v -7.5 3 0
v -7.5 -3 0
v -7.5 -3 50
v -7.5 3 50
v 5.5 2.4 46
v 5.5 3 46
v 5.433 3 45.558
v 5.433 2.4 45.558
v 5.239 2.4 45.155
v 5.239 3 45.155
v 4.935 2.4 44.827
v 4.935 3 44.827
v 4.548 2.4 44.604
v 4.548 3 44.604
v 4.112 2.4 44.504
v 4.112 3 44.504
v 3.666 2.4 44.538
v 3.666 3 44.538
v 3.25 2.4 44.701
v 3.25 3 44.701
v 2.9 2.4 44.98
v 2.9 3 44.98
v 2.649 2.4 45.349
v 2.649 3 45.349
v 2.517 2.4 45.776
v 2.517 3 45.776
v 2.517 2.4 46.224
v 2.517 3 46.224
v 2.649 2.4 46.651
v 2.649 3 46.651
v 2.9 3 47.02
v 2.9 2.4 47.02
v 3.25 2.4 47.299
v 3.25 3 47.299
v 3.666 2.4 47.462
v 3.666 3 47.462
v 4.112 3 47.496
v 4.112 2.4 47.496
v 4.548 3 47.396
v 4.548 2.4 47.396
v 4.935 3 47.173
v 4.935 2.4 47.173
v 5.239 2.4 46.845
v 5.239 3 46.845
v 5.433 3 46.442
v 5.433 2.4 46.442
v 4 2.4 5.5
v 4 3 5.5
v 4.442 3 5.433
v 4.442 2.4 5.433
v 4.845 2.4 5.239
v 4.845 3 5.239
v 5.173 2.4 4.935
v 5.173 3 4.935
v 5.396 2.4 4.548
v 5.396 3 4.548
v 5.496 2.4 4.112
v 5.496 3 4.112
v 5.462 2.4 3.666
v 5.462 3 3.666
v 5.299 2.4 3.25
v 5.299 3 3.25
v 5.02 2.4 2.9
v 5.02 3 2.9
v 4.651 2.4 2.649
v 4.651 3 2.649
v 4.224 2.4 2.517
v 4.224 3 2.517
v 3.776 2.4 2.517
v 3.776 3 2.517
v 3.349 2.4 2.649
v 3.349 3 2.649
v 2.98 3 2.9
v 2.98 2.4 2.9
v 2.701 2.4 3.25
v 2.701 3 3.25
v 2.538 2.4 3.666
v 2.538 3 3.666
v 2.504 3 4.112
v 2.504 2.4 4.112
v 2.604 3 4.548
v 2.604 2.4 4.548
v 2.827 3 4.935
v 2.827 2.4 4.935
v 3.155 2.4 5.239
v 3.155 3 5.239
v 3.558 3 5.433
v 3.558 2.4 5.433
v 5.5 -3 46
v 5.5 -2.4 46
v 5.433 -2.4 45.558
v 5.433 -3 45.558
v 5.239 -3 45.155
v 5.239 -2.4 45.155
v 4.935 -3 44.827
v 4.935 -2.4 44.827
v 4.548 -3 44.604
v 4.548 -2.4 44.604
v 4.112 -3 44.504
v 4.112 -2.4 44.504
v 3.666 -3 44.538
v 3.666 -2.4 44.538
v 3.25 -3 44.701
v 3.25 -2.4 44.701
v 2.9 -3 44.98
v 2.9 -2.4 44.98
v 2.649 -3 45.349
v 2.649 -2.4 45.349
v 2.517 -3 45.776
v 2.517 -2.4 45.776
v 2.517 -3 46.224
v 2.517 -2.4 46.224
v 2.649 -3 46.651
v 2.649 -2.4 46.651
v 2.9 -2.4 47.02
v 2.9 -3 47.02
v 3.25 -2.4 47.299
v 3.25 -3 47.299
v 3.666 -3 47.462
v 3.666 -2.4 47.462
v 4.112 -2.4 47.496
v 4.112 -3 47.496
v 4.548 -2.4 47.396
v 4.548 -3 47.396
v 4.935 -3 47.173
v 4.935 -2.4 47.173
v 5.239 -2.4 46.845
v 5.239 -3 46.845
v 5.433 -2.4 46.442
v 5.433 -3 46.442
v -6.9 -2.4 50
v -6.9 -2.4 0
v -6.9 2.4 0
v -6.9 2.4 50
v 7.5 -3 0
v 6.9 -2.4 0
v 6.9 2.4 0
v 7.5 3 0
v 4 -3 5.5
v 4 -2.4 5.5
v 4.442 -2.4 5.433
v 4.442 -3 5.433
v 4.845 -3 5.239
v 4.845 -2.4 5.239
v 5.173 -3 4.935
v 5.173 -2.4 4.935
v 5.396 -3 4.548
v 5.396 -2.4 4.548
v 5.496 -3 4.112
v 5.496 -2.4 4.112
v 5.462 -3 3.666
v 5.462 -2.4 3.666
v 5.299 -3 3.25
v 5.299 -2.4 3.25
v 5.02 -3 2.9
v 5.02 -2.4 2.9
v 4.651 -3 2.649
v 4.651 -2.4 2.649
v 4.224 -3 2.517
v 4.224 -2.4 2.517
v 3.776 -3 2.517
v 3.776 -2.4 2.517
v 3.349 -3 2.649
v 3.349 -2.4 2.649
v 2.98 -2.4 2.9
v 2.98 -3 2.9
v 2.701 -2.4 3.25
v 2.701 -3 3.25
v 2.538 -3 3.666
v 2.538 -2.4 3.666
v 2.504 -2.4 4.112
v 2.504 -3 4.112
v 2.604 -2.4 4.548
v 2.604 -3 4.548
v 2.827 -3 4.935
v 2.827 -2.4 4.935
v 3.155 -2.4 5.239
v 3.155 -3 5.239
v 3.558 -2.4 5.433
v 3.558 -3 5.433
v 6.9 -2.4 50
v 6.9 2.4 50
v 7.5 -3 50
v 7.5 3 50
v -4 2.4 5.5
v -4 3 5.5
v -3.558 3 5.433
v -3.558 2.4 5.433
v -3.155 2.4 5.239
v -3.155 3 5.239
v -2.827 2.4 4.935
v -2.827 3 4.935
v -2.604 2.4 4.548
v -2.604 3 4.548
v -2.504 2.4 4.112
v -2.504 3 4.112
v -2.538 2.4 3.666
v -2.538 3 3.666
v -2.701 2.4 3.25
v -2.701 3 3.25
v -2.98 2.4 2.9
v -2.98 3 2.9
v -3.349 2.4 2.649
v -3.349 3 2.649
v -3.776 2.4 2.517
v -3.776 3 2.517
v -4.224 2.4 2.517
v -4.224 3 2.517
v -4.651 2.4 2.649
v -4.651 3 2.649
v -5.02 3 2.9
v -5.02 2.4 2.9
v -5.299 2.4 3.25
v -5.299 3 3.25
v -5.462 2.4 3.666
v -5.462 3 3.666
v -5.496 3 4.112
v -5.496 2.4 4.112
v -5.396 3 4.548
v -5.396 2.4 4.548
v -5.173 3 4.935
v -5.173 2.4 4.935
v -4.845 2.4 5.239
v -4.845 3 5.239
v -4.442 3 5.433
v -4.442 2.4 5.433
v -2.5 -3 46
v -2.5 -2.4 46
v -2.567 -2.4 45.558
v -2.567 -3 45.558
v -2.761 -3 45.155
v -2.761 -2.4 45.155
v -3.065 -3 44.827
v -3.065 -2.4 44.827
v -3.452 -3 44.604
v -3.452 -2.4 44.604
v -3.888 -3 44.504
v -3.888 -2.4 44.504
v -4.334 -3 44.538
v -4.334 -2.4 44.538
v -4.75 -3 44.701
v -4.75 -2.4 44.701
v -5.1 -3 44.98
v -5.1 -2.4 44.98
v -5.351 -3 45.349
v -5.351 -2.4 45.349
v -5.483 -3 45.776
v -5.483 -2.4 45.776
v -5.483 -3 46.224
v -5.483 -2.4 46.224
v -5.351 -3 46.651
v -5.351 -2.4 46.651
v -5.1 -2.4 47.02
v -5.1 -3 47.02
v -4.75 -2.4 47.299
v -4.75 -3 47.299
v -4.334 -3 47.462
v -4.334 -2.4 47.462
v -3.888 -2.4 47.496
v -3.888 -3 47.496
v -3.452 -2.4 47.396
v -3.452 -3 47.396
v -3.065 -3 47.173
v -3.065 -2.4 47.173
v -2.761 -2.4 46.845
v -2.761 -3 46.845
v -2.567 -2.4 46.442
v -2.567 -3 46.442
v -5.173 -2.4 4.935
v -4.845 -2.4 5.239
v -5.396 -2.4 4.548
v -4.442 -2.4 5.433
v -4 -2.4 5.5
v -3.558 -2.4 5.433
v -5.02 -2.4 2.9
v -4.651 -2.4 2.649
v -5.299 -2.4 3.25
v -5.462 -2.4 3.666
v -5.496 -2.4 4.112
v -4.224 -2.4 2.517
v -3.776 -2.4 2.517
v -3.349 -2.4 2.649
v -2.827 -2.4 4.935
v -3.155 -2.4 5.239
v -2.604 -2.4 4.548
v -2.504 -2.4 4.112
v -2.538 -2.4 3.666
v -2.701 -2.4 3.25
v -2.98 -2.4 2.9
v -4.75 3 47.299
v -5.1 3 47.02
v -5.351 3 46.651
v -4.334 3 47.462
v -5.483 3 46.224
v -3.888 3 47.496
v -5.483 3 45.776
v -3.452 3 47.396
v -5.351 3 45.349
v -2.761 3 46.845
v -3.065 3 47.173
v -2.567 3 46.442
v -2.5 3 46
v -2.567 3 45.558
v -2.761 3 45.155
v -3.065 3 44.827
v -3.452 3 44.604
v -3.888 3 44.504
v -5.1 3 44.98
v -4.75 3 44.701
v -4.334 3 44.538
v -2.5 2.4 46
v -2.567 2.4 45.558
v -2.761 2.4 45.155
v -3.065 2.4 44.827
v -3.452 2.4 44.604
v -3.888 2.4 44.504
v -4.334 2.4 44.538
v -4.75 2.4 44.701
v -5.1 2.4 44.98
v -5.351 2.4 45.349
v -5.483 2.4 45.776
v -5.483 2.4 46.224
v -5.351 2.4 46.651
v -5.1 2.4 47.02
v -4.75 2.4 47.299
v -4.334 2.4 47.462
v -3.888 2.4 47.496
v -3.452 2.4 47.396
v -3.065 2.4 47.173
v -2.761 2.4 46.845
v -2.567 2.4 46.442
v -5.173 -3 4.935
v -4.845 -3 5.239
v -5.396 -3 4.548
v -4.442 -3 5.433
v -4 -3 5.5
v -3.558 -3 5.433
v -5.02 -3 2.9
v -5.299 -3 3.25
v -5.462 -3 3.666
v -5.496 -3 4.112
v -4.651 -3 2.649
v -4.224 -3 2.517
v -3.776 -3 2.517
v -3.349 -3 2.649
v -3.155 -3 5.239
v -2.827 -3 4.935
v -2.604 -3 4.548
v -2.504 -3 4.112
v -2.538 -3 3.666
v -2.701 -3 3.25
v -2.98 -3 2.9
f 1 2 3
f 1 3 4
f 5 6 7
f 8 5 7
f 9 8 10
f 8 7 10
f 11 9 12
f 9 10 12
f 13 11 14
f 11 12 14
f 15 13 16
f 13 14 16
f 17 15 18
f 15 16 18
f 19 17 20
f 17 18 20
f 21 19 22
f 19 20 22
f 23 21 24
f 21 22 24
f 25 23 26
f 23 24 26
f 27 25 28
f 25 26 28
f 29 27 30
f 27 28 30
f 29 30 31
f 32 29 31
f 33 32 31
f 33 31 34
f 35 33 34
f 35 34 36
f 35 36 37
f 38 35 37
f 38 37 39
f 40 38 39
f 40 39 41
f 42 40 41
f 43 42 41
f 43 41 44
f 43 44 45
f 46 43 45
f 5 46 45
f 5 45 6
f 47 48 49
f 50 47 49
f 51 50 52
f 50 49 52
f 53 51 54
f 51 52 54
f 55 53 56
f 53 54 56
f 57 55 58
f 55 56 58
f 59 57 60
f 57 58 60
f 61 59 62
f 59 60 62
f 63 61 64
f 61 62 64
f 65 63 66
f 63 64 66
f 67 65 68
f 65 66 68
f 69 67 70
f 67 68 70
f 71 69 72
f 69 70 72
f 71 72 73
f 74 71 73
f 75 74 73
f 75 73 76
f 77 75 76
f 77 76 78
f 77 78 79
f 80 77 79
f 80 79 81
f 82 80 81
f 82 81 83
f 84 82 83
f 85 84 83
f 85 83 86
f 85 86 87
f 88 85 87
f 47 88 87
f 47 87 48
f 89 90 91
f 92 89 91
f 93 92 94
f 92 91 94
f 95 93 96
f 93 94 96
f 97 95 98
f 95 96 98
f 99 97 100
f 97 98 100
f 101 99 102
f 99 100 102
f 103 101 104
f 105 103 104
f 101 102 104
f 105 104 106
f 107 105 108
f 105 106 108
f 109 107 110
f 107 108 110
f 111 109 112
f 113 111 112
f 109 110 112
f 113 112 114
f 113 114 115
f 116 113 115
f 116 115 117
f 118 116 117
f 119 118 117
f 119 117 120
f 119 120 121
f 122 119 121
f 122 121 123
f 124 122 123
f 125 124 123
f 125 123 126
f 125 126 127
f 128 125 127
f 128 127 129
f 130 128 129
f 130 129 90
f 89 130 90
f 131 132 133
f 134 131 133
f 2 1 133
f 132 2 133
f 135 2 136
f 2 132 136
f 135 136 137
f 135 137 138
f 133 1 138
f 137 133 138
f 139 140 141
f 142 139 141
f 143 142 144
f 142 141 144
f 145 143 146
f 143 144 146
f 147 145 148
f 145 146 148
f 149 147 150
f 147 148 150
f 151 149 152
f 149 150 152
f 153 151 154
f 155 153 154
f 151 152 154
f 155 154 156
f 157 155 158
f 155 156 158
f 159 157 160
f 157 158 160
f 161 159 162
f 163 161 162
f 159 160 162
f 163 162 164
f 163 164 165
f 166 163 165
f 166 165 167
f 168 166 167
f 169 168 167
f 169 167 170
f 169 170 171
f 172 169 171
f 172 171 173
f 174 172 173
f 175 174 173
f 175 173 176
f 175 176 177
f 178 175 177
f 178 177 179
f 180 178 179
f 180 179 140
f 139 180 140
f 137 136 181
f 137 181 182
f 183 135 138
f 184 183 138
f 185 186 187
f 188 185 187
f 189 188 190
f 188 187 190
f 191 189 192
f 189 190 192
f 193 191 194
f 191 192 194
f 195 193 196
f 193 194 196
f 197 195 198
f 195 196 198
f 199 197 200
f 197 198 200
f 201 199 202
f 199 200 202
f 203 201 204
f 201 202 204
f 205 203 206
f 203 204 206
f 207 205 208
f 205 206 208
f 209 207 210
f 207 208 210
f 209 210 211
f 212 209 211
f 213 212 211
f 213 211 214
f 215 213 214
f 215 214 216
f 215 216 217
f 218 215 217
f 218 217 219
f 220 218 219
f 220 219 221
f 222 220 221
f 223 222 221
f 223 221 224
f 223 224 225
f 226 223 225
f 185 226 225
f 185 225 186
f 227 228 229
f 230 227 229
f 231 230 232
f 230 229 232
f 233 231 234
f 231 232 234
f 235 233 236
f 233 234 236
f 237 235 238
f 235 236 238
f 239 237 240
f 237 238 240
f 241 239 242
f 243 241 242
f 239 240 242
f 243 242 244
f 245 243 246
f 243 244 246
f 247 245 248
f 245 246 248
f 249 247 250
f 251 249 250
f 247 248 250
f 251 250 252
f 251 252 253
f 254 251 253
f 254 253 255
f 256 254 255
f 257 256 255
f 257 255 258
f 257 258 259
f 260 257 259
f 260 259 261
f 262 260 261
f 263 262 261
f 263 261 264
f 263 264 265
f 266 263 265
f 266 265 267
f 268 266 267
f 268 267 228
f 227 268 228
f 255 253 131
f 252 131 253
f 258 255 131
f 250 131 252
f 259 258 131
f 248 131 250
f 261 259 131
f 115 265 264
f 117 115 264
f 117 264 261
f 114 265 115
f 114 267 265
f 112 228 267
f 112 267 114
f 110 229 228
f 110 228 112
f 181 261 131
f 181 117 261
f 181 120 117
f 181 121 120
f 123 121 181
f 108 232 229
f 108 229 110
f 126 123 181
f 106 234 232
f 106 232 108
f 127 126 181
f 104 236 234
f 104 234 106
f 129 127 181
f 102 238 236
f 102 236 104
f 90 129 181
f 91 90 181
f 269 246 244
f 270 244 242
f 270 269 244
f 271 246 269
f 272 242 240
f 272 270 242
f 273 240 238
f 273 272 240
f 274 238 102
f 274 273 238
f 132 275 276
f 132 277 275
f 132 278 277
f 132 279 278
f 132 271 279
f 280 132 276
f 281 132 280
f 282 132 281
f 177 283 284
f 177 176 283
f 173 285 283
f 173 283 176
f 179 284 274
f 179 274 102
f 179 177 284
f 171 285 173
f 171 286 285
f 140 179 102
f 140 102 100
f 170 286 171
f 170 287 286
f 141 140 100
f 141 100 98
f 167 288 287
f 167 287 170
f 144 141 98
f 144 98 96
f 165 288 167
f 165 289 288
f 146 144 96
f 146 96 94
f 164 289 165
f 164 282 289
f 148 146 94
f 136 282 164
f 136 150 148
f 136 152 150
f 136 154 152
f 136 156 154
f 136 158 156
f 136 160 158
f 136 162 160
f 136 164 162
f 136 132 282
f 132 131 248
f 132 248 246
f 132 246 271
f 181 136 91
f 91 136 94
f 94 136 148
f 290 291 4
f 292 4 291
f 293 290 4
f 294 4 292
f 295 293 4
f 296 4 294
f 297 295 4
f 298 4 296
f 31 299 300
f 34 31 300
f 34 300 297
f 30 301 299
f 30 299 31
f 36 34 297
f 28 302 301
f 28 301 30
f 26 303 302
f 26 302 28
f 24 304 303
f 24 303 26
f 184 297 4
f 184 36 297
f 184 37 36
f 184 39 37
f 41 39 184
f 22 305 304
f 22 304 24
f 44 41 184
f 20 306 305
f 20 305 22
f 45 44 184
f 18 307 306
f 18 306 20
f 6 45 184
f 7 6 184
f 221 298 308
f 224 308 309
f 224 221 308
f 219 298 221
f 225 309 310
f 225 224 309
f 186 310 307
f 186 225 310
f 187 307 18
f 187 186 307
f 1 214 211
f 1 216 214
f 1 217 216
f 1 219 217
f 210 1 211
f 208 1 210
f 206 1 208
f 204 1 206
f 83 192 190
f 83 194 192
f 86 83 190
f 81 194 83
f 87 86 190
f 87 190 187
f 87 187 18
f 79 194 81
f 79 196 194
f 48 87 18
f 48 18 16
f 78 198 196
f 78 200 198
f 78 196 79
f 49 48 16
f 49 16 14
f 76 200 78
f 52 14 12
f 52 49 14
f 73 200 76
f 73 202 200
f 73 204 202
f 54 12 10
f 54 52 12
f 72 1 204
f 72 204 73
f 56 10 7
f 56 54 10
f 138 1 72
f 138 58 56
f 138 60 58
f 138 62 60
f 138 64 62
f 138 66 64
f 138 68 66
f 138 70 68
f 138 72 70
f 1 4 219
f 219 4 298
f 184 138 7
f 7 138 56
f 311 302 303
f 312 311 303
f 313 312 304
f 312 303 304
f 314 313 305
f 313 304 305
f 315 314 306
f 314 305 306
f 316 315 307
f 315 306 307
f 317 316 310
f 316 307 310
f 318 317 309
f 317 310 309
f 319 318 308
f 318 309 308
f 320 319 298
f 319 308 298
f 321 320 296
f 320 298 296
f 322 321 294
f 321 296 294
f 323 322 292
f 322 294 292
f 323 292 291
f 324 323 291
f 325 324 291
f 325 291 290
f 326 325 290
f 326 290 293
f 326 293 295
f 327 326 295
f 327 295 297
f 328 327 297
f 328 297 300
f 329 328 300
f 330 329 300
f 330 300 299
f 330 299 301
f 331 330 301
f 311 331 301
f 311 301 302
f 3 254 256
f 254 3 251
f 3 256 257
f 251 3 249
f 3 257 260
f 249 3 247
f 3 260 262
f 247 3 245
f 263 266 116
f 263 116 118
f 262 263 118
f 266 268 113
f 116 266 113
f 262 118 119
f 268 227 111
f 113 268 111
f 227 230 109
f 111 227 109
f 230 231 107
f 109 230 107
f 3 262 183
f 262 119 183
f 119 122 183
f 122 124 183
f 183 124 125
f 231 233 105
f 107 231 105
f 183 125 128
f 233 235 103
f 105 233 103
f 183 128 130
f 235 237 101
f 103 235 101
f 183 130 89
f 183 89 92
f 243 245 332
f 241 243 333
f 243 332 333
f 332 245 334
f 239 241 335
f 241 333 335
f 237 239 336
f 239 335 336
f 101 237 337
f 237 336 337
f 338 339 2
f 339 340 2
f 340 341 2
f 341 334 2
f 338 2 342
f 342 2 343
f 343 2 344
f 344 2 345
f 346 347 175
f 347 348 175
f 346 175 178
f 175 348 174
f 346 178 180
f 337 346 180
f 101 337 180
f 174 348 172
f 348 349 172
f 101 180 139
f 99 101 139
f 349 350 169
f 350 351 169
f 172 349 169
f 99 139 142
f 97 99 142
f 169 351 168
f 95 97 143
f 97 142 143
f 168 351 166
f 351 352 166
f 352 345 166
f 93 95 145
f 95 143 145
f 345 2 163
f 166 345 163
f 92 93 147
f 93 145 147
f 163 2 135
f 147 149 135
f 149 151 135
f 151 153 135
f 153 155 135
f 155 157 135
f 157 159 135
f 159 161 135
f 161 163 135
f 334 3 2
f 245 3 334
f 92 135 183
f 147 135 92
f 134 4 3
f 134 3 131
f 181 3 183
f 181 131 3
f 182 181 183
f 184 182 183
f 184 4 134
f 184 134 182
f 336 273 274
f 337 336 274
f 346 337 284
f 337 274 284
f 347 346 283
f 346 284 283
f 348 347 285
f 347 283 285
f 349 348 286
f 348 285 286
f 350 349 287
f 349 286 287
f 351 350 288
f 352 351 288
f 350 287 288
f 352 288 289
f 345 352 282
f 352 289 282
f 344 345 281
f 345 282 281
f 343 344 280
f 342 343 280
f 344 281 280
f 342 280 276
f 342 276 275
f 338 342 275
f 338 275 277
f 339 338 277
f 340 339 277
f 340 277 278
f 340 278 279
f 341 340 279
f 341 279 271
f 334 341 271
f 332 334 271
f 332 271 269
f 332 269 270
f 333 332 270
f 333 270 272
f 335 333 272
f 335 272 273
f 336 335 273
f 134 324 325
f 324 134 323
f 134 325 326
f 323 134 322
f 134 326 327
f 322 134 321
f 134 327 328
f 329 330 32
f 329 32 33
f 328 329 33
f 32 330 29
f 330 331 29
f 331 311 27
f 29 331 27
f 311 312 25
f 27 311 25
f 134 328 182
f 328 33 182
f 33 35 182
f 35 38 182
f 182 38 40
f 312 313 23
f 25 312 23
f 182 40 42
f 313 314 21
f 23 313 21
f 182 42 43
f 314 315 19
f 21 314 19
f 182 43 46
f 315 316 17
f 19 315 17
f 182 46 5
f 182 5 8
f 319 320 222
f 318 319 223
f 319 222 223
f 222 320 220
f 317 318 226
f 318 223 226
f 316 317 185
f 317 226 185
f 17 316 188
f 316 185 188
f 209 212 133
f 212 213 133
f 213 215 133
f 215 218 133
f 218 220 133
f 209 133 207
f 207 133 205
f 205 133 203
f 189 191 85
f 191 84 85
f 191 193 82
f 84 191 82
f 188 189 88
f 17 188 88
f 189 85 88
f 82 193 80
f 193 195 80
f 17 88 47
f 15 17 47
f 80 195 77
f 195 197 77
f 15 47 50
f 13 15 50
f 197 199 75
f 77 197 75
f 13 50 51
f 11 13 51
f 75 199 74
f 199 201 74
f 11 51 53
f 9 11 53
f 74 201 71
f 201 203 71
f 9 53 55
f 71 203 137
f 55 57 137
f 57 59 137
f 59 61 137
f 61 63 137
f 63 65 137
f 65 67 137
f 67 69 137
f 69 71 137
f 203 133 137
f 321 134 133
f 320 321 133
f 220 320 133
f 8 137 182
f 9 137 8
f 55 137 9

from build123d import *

# Parameters (mm, degrees)
SKETCH_2_W          = 15
SKETCH_2_H          = 6
SKETCH_2_W_2        = 13.8
SKETCH_2_H_2        = 4.8
EXTRUDE_1_DEPTH     = 50
SKETCH_3_R          = 1.5
CUT_EXTRUDE_1_DEPTH = 80


with BuildPart() as part:
    # 草图2 → 凸台-拉伸1 (new body)
    with BuildSketch(Plane.XY):
        Rectangle(SKETCH_2_W, SKETCH_2_H)
        Rectangle(SKETCH_2_W_2, SKETCH_2_H_2, mode=Mode.SUBTRACT)
    extrude(amount=EXTRUDE_1_DEPTH)

    # 草图3 → 切除-拉伸1 (cut)
    with BuildSketch(Plane(origin=(0, 3, 0), x_dir=(1, 0, 0), z_dir=(0, 1, 0))):
        with Locations(Location((-4, -4, 0), (0, 0, 270))):
            Circle(SKETCH_3_R)
        with Locations(Location((4, -4, 0), (0, 0, 270))):
            Circle(SKETCH_3_R)
        with Locations((4, -46)):
            Circle(SKETCH_3_R)
        with Locations((-4, -46)):
            Circle(SKETCH_3_R)
    extrude(amount=-CUT_EXTRUDE_1_DEPTH, mode=Mode.SUBTRACT)


solid = part.part
